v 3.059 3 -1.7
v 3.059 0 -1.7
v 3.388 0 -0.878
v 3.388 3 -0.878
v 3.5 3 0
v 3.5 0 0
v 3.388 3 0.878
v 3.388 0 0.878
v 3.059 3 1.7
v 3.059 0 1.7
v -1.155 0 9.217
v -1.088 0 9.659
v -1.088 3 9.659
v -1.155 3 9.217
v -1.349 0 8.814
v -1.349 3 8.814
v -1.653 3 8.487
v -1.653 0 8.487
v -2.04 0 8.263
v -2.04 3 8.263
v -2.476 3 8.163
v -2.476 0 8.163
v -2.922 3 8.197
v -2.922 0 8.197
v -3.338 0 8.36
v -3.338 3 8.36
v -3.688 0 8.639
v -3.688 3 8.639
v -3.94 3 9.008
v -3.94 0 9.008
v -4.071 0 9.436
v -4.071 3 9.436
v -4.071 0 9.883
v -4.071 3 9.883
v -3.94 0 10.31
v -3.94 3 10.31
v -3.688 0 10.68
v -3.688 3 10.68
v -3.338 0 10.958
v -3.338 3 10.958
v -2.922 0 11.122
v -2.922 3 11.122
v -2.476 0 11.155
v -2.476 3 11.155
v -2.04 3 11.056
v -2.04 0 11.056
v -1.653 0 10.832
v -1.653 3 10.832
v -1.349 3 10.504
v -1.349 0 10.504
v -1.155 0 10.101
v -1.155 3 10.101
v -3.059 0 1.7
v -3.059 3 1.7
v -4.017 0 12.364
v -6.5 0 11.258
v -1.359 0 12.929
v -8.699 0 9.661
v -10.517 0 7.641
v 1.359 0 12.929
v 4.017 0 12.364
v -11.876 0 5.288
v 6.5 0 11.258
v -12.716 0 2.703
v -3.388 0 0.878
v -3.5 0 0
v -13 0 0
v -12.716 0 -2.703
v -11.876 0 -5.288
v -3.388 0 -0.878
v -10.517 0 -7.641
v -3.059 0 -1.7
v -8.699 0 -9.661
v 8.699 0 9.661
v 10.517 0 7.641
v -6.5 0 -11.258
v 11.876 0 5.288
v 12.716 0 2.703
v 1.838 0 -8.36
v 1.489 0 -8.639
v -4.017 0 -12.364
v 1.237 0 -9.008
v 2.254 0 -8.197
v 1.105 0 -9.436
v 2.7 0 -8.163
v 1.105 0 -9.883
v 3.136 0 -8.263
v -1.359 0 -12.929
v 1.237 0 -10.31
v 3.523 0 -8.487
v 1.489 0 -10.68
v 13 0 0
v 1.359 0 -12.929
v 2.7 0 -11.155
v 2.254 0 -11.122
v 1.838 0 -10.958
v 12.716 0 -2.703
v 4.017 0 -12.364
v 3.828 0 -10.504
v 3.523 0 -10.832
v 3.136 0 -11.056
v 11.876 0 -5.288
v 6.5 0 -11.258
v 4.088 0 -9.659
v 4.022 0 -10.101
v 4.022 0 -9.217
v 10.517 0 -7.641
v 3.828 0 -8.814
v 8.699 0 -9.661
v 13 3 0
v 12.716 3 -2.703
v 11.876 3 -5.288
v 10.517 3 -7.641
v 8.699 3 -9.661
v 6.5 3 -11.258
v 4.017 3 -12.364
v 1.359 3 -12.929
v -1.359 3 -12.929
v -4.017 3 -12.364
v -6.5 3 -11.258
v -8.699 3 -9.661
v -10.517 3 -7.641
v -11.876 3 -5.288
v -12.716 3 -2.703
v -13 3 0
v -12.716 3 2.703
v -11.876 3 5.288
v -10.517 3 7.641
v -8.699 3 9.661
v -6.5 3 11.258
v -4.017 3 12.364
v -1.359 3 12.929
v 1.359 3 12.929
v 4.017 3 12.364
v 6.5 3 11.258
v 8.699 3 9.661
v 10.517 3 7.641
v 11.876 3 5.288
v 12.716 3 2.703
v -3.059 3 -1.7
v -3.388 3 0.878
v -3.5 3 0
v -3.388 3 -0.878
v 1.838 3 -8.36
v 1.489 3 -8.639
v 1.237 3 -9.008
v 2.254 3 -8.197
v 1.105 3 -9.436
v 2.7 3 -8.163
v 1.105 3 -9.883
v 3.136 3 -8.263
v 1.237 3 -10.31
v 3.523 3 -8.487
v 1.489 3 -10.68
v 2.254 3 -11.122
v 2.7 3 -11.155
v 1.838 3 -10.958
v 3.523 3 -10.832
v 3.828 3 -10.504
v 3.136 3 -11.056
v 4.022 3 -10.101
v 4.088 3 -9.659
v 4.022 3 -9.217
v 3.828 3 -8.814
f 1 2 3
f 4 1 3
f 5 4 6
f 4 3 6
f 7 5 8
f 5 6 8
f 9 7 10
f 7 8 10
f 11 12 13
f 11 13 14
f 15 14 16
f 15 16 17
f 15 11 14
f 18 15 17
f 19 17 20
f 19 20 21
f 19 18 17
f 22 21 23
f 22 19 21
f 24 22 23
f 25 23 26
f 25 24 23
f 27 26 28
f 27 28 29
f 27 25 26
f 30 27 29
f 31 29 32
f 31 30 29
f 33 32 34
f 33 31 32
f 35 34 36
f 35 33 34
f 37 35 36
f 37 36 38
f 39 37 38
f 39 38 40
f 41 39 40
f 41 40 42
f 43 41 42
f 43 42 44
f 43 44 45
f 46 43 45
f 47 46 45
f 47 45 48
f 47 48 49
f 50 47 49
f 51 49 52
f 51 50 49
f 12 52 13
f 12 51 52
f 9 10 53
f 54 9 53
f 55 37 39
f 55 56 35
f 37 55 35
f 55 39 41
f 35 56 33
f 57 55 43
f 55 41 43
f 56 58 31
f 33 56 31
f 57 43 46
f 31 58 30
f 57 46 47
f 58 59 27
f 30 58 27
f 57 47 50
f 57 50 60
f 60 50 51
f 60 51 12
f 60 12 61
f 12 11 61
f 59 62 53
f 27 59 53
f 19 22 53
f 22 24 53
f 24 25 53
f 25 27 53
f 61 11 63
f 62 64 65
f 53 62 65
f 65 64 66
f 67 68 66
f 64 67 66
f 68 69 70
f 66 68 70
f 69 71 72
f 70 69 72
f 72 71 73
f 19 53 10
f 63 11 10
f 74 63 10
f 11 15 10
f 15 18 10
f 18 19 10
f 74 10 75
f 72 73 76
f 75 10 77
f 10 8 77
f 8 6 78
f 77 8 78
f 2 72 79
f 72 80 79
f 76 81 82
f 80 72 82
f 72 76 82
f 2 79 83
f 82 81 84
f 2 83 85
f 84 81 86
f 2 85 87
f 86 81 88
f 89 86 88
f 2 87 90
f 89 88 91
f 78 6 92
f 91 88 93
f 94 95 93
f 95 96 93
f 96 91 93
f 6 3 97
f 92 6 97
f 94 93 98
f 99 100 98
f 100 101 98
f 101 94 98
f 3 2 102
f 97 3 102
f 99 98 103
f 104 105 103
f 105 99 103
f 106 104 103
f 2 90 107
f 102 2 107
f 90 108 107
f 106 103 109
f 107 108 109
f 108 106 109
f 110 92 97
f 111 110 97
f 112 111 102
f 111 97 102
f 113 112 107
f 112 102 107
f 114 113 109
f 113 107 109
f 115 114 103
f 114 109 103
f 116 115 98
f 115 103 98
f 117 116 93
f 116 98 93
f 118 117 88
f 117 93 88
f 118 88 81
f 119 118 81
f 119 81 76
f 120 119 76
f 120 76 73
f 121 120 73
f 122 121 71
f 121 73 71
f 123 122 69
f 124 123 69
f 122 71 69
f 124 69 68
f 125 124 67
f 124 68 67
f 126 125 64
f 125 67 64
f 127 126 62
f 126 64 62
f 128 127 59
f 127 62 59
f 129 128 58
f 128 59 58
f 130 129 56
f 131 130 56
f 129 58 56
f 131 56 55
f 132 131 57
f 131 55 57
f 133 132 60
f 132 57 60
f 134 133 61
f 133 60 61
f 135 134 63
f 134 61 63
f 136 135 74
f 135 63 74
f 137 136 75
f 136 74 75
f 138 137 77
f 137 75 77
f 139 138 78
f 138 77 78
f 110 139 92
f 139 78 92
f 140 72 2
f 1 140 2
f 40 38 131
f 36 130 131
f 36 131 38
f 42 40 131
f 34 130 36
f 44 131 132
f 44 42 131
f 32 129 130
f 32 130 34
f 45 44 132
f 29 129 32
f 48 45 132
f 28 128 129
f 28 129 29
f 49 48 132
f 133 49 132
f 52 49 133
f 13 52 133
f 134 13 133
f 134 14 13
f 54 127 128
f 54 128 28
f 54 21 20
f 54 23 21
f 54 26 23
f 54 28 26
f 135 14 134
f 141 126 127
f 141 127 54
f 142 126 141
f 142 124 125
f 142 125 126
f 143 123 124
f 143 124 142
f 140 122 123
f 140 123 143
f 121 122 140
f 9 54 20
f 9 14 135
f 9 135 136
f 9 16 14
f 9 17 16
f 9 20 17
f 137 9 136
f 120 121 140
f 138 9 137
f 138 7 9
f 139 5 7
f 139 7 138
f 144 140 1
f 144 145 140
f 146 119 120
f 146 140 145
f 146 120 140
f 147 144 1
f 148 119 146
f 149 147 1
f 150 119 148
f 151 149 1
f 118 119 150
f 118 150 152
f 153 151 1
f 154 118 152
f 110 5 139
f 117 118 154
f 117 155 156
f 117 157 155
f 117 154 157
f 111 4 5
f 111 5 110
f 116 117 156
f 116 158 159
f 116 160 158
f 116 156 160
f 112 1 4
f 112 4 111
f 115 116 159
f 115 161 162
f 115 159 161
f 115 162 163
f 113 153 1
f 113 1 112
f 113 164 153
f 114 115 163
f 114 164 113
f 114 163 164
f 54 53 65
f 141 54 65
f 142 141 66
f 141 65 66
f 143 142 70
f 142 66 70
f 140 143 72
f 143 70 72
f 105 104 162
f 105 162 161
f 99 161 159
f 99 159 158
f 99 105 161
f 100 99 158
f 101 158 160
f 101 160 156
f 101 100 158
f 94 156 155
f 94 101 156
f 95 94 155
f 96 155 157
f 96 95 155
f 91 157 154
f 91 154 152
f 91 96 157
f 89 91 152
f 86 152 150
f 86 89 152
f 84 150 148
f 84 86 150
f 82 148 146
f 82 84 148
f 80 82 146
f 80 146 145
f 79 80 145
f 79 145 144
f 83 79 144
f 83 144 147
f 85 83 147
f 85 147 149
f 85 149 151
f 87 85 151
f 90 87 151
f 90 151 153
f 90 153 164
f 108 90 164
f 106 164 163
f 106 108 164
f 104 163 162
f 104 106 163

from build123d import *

# Parameters (mm, degrees)
SKETCH1_R           = 13
SKETCH1_R_2         = 1.5
BOSS_EXTRUDE1_DEPTH = 3


with BuildPart() as part:
    # Sketch1 → Boss-Extrude1 (new body)
    with BuildSketch(Plane(origin=(0, 0, 0), x_dir=(1, 0, 0), z_dir=(0, 1, 0))):
        Circle(SKETCH1_R)
        with Locations((-2.588190451, -9.659258263)):
            Circle(SKETCH1_R_2, mode=Mode.SUBTRACT)
        with Locations((2.588190451, 9.659258263)):
            Circle(SKETCH1_R_2, mode=Mode.SUBTRACT)
        with BuildLine():
            Line((-3.059411708, 1.7), (3.059411708, 1.7))
            ThreePointArc((3.059411708, 1.7), (3.5, 0), (3.059411708, -1.7))
            Line((3.059411708, -1.7), (-3.059411708, -1.7))
            ThreePointArc((-3.059411708, -1.7), (-3.5, 0), (-3.059411708, 1.7))
        make_face(mode=Mode.SUBTRACT)
    extrude(amount=BOSS_EXTRUDE1_DEPTH)


solid = part.part
